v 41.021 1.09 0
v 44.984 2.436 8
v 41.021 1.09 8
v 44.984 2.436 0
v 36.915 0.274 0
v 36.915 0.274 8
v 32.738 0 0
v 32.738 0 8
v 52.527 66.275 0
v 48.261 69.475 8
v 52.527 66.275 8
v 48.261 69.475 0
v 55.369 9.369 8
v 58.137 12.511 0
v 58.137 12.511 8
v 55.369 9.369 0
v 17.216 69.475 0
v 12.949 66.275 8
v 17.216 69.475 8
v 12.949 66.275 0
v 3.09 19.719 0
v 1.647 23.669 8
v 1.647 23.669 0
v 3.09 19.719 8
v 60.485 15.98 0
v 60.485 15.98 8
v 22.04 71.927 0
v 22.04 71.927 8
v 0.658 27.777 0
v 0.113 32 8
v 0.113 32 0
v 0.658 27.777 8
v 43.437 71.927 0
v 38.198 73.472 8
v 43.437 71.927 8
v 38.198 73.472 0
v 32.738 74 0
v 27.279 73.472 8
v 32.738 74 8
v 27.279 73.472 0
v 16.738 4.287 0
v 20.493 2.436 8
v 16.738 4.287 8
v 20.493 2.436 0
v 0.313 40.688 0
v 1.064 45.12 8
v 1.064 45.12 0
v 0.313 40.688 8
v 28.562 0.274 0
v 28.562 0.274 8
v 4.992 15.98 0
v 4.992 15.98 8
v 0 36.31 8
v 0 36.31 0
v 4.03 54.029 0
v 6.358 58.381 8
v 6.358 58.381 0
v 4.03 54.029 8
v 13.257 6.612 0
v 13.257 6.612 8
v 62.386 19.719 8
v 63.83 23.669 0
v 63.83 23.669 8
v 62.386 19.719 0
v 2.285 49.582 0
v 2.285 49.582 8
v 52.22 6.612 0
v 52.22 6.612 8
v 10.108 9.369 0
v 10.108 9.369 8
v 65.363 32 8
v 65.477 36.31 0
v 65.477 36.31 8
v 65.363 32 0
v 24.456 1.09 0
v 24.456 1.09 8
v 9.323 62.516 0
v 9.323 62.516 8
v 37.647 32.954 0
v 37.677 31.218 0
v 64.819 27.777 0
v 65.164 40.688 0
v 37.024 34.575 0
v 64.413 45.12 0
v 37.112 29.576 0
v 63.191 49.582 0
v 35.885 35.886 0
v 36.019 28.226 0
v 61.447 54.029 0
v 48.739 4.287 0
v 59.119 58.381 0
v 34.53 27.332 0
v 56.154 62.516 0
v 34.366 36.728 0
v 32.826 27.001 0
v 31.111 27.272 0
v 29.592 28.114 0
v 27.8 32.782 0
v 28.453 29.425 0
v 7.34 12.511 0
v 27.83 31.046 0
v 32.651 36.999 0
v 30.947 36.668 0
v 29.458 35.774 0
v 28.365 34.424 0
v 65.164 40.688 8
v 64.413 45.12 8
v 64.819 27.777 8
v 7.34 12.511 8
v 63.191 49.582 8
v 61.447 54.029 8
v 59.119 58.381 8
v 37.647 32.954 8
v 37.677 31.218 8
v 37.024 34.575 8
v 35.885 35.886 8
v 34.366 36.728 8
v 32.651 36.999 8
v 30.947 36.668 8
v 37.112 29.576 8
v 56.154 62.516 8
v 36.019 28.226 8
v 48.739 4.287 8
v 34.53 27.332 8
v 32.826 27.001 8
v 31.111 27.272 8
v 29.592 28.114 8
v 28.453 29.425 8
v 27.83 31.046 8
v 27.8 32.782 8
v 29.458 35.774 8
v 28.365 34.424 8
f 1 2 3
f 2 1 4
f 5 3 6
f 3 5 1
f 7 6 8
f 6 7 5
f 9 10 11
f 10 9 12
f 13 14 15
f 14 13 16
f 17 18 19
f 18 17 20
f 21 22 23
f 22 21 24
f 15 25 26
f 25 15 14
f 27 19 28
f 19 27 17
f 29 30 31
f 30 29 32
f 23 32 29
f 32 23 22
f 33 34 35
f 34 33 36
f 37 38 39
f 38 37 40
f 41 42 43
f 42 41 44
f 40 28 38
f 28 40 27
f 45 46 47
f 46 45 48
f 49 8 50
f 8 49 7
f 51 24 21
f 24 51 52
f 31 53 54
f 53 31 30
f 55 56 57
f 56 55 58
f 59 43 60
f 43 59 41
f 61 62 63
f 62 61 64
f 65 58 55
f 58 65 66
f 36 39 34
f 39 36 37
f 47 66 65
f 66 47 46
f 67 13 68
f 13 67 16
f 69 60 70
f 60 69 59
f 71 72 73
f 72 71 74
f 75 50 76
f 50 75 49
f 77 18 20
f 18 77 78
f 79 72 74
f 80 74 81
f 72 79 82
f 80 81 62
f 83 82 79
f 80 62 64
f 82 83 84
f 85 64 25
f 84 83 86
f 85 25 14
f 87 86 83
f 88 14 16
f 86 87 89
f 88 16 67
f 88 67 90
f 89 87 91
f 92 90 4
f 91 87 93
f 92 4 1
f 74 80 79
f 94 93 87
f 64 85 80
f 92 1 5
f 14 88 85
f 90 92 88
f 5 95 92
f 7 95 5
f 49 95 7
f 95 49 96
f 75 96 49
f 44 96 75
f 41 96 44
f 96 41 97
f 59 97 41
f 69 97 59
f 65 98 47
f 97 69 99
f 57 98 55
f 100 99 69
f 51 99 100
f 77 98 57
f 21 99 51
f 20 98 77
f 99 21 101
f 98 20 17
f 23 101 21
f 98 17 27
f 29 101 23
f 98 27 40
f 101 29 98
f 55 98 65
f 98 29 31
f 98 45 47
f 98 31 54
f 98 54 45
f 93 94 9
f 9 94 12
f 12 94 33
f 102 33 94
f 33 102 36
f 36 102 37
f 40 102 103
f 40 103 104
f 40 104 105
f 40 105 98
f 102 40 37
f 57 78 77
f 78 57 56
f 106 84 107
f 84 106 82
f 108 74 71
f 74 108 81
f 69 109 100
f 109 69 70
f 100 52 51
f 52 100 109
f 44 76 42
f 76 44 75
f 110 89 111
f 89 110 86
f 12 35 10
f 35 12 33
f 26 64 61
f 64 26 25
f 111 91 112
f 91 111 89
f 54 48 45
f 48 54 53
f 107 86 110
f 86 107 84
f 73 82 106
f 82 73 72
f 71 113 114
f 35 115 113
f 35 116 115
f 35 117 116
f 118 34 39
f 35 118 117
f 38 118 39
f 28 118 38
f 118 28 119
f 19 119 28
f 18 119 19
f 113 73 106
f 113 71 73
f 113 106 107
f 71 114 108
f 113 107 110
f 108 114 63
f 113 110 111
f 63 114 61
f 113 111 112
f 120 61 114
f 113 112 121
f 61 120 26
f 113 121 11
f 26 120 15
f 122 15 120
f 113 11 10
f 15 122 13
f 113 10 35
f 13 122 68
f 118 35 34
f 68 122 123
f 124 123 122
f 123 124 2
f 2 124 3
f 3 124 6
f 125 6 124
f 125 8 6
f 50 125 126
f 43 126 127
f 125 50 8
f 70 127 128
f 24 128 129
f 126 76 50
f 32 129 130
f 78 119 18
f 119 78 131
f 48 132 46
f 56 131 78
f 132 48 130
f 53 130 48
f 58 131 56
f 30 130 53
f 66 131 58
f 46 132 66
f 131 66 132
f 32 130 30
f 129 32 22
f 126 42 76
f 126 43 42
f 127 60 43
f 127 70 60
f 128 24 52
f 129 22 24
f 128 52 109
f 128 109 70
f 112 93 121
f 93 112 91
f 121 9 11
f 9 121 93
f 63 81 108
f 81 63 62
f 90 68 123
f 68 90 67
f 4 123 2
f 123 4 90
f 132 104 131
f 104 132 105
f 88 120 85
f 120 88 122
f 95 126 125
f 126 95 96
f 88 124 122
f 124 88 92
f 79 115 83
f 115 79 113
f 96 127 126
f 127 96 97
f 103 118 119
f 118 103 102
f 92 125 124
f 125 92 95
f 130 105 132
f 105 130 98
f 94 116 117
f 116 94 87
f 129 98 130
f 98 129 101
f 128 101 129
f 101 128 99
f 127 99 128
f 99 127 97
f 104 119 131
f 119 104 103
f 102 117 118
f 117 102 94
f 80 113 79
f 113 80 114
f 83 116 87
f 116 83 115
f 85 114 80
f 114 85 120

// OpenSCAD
$fn = 32;

// ----------------------------------------------------------------------
// Cam plate: single_lobe cam, base R32
// ----------------------------------------------------------------------

// --- parameters (mm) ---
base_r = 32;              // base circle radius
lobe_h = 10;              // cam lobe rise
bore_r = 5;               // shaft bore radius
plate_t = 8;              // plate thickness, Z (extrusion height)

profile = [[65.363, 32], [65.477, 36.31], [65.164, 40.688], [64.413, 45.12], [63.191, 49.582], [61.447, 54.029], [59.119, 58.381], [56.154, 62.516], [52.527, 66.275], [48.261, 69.475], [43.437, 71.927], [38.198, 73.472], [32.738, 74], [27.279, 73.472], [22.04, 71.927], [17.216, 69.475], [12.949, 66.275], [9.323, 62.516], [6.358, 58.381], [4.03, 54.029], [2.285, 49.582], [1.064, 45.12], [0.313, 40.688], [0, 36.31], [0.113, 32], [0.658, 27.777], [1.647, 23.669], [3.09, 19.719], [4.992, 15.98], [7.34, 12.511], [10.108, 9.369], [13.257, 6.612], [16.738, 4.287], [20.493, 2.436], [24.456, 1.09], [28.562, 0.274], [32.738, 0], [36.915, 0.274], [41.021, 1.09], [44.984, 2.436], [48.739, 4.287], [52.22, 6.612], [55.369, 9.369], [58.137, 12.511], [60.485, 15.98], [62.386, 19.719], [63.83, 23.669], [64.819, 27.777]];  // primary outline, 48 points, counter clockwise
void_1 = [[37.647, 32.954], [37.024, 34.575], [35.885, 35.886], [34.366, 36.728], [32.651, 36.999], [30.947, 36.668], [29.458, 35.774], [28.365, 34.424], [27.8, 32.782], [27.83, 31.046], [28.453, 29.425], [29.592, 28.114], [31.111, 27.272], [32.826, 27.001], [34.53, 27.332], [36.019, 28.226], [37.112, 29.576], [37.677, 31.218]];  // shaft bore, 18 points

// --- the one profile operation ---
difference() {
  linear_extrude(height = plate_t) polygon(points = profile);
  translate([0, 0, -1])
    linear_extrude(height = plate_t + 2) polygon(points = void_1);
}
